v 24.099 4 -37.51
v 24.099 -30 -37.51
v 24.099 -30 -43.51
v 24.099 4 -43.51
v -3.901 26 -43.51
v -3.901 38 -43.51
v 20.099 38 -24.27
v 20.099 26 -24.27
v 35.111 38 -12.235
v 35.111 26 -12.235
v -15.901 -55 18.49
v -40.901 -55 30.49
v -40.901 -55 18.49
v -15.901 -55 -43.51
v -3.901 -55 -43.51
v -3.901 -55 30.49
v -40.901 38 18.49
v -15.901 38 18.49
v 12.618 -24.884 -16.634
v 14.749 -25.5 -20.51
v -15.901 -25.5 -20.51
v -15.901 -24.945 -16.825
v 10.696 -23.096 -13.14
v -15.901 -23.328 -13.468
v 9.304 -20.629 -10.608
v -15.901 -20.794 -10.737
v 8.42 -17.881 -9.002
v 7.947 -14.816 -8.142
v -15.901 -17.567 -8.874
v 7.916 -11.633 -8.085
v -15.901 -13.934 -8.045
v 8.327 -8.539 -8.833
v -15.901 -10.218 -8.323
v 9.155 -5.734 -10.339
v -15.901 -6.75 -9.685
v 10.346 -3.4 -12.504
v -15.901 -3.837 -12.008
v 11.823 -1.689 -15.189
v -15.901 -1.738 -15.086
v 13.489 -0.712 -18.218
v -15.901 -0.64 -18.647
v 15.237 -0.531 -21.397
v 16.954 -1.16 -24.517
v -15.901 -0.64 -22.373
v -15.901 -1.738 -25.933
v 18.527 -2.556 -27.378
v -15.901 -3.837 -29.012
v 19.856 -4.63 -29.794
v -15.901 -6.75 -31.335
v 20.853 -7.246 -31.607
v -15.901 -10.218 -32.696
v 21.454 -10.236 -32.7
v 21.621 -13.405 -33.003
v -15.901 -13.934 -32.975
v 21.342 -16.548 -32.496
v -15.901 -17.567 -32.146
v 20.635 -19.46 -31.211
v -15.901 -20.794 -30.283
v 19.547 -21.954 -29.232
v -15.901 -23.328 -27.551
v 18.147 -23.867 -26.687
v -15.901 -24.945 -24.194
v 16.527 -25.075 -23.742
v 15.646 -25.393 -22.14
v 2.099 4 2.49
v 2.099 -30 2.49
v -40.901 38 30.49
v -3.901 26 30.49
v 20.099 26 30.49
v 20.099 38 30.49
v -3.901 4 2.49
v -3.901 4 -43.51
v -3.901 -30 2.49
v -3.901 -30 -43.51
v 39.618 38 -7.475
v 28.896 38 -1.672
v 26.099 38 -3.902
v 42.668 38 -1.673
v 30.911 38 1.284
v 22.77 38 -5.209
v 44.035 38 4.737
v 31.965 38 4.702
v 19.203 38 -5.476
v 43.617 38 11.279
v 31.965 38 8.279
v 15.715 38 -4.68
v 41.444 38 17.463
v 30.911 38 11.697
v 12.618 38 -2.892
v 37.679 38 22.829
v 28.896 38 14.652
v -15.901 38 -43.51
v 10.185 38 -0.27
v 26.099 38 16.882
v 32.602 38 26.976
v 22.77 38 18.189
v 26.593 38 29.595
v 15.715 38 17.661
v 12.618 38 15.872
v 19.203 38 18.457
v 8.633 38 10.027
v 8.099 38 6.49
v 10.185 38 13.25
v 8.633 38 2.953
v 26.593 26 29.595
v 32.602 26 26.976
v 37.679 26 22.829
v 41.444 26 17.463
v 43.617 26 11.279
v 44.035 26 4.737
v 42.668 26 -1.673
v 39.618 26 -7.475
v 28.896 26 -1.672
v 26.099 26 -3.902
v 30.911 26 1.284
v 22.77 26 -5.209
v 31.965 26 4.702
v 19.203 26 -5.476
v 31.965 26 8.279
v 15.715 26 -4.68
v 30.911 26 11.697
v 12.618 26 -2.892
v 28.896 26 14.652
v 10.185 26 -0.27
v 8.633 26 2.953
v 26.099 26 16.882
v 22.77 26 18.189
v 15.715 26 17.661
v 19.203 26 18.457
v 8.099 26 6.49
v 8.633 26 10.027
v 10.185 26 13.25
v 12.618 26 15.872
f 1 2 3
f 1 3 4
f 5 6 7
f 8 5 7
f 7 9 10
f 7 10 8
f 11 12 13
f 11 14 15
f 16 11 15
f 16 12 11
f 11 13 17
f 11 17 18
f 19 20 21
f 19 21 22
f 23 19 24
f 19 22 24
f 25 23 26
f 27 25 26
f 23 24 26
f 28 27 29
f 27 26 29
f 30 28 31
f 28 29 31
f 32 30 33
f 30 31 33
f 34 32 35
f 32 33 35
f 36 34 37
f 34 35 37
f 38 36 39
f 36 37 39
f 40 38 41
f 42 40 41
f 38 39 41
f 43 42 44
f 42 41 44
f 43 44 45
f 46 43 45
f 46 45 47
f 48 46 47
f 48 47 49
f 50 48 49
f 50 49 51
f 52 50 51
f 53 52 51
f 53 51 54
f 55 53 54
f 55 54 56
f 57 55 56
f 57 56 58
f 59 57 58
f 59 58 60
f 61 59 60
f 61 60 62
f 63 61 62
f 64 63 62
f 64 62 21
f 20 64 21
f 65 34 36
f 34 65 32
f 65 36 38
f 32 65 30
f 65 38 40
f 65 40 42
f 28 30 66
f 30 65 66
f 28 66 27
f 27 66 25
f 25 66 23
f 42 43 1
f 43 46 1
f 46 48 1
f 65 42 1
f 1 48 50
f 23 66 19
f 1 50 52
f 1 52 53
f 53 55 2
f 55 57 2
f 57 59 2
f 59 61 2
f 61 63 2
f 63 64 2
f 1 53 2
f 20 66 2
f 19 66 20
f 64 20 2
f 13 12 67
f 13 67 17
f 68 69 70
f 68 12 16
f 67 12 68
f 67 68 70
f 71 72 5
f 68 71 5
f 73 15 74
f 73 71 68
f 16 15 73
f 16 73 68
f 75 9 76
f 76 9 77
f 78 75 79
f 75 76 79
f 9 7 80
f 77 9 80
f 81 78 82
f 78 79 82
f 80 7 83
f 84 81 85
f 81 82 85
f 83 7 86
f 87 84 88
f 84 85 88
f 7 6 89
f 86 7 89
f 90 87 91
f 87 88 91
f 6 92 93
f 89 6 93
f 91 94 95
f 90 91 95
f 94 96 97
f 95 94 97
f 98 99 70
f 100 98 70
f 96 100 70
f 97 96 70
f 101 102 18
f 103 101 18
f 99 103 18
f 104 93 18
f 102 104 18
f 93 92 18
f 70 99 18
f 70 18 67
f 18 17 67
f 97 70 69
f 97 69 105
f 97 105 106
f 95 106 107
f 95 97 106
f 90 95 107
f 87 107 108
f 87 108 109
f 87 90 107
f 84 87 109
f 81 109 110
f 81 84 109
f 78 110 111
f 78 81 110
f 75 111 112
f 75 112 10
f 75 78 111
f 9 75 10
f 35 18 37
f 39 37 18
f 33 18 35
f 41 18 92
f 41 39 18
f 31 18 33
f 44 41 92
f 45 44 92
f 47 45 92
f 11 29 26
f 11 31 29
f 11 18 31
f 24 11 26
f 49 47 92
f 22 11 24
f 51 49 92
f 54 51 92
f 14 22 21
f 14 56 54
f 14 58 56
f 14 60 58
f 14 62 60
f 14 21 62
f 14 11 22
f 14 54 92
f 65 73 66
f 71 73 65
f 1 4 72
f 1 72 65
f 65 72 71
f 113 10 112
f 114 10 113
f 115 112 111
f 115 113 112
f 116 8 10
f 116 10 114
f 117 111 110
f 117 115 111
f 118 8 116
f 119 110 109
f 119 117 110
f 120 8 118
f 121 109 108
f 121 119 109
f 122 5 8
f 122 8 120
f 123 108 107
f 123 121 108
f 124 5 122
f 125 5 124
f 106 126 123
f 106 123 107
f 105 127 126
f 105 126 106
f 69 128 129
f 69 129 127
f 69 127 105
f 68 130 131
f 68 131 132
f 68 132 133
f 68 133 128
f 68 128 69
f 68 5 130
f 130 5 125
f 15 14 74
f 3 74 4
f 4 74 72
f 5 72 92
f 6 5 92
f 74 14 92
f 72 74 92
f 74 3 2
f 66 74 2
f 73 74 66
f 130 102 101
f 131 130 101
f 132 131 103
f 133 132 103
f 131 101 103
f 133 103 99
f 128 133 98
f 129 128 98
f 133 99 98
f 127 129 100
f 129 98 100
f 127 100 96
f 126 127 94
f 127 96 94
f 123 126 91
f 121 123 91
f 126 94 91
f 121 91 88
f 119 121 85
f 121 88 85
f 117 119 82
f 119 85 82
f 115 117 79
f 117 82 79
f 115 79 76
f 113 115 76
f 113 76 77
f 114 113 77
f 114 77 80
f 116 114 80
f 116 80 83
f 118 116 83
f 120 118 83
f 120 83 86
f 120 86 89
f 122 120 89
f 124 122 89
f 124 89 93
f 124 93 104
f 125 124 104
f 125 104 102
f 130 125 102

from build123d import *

# Parameters (mm, degrees)
F1_DEPTH  = 55
F2_W      = 34
F2_H      = 46
F3_DEPTH  = 28
F5_DEPTH  = 34
F6_R      = 12.5
F8_DEPTH  = 100
F10_DEPTH = 17
F11_W     = 12
F11_H     = 74
F12_DEPTH = 24
F14_DEPTH = 12
F15_DEPTH = 12
F16_R     = 12
F17_DEPTH = 25


# Not quite as in the source:
# - a feature of the source that left no trace in its solid (it failed there, or was rolled back) is left out


with BuildPart() as f1:
    # F0 (on Front) → F1 (new body, symmetric)
    with BuildSketch(Plane.XZ):
        Polygon((-3.9005428076, 30.4901414615), (-40.9005428076, 30.4901414615), (-40.9005428076, 18.4901414615), (-15.9005428076, 18.4901414615), (-15.9005428076, -43.5098585385), (-3.9005428076, -43.5098585385), align=None)
    extrude(amount=F1_DEPTH, both=True)

    # F2 (on face) → F3 (join)
    with BuildSketch(Plane.YZ.offset(-3.9005428076)):
        with Locations((-13, -20.5098585385)):
            Rectangle(F2_W, F2_H)
    extrude(amount=F3_DEPTH)

    # F4 (on face) → F5 (cut)
    with BuildSketch(Plane.XZ.offset(30)):
        Polygon((24.0994571924, 2.4901414615), (2.0994571924, 2.4901414615), (24.0994571924, -37.5098585385), align=None)
    extrude(amount=-F5_DEPTH, mode=Mode.SUBTRACT)

    # F6 (on face) → F8 (cut)
    with BuildSketch(Plane(origin=(-15.9005428076, 0, 0), x_dir=(0, -1, 0), z_dir=(-1, 0, 0))):
        with Locations((13, -20.5098585385)):
            Circle(F6_R)
    extrude(amount=-F8_DEPTH, mode=Mode.SUBTRACT)

    # F10 (cut): a face of the model
    f10_faces = [f1.faces().sort_by_distance(p)[0] for p in [
        (-14.5722599793, 55, 1.3184242898),
    ]]
    extrude(f10_faces, amount=-F10_DEPTH, mode=Mode.SUBTRACT)

    # F11 (on face) → F12 (join)
    with BuildSketch(Plane.YZ.offset(-3.9005428076)):
        with Locations((32, -6.5098585385)):
            Rectangle(F11_W, F11_H)
    extrude(amount=F12_DEPTH)

    # F13 (on face) → F14 (cut)
    with BuildSketch(Plane(origin=(0, 38, 0), x_dir=(-1, 0, 0), z_dir=(0, 1, 0))):
        with BuildLine():
            ThreePointArc((-20.0994571924, -17.5098585385), (-28.0551210727, -16.1529018901), (-35.1111607034, -12.2354762238))
            Line((-35.1111607034, -12.2354762238), (-20.0994571924, -24.2698585385))
            Line((-20.0994571924, -24.2698585385), (-20.0994571924, -17.5098585385))
        make_face()
        Polygon((3.9005428076, -43.5098585385), (-20.0994571924, -24.2698585385), (-20.0994571924, -43.5098585385), align=None)
    extrude(amount=-F14_DEPTH, mode=Mode.SUBTRACT)

    # F13 (on face) → F15 (join)
    with BuildSketch(Plane(origin=(0, 38, 0), x_dir=(-1, 0, 0), z_dir=(0, 1, 0))):
        with BuildLine():
            ThreePointArc((-35.1111607034, -12.2354762238), (-9.7139115703, -15.1464119177), (3.9005428076, 6.4901414615))
            ThreePointArc((3.9005428076, 6.4901414615), (-3.1288944439, 23.46070421), (-20.0994571924, 30.4901414615))
            ThreePointArc((-20.0994571924, 30.4901414615), (-42.742500544, 14.4458053418), (-35.1111607034, -12.2354762238))
        make_face()
        with BuildLine():
            ThreePointArc((-20.0994571924, -17.5098585385), (-28.0551210727, -16.1529018901), (-35.1111607034, -12.2354762238))
            Line((-35.1111607034, -12.2354762238), (-20.0994571924, -24.2698585385))
            Line((-20.0994571924, -24.2698585385), (-20.0994571924, -17.5098585385))
        make_face()
    extrude(amount=-F15_DEPTH)

    # F16 (on face) → F17 (cut)
    with BuildSketch(Plane(origin=(0, 38, 0), x_dir=(-1, 0, 0), z_dir=(0, 1, 0))):
        with Locations((-20.0994571924, 6.4901414615)):
            Circle(F16_R)
    extrude(amount=-F17_DEPTH, mode=Mode.SUBTRACT)


solid = f1.part
